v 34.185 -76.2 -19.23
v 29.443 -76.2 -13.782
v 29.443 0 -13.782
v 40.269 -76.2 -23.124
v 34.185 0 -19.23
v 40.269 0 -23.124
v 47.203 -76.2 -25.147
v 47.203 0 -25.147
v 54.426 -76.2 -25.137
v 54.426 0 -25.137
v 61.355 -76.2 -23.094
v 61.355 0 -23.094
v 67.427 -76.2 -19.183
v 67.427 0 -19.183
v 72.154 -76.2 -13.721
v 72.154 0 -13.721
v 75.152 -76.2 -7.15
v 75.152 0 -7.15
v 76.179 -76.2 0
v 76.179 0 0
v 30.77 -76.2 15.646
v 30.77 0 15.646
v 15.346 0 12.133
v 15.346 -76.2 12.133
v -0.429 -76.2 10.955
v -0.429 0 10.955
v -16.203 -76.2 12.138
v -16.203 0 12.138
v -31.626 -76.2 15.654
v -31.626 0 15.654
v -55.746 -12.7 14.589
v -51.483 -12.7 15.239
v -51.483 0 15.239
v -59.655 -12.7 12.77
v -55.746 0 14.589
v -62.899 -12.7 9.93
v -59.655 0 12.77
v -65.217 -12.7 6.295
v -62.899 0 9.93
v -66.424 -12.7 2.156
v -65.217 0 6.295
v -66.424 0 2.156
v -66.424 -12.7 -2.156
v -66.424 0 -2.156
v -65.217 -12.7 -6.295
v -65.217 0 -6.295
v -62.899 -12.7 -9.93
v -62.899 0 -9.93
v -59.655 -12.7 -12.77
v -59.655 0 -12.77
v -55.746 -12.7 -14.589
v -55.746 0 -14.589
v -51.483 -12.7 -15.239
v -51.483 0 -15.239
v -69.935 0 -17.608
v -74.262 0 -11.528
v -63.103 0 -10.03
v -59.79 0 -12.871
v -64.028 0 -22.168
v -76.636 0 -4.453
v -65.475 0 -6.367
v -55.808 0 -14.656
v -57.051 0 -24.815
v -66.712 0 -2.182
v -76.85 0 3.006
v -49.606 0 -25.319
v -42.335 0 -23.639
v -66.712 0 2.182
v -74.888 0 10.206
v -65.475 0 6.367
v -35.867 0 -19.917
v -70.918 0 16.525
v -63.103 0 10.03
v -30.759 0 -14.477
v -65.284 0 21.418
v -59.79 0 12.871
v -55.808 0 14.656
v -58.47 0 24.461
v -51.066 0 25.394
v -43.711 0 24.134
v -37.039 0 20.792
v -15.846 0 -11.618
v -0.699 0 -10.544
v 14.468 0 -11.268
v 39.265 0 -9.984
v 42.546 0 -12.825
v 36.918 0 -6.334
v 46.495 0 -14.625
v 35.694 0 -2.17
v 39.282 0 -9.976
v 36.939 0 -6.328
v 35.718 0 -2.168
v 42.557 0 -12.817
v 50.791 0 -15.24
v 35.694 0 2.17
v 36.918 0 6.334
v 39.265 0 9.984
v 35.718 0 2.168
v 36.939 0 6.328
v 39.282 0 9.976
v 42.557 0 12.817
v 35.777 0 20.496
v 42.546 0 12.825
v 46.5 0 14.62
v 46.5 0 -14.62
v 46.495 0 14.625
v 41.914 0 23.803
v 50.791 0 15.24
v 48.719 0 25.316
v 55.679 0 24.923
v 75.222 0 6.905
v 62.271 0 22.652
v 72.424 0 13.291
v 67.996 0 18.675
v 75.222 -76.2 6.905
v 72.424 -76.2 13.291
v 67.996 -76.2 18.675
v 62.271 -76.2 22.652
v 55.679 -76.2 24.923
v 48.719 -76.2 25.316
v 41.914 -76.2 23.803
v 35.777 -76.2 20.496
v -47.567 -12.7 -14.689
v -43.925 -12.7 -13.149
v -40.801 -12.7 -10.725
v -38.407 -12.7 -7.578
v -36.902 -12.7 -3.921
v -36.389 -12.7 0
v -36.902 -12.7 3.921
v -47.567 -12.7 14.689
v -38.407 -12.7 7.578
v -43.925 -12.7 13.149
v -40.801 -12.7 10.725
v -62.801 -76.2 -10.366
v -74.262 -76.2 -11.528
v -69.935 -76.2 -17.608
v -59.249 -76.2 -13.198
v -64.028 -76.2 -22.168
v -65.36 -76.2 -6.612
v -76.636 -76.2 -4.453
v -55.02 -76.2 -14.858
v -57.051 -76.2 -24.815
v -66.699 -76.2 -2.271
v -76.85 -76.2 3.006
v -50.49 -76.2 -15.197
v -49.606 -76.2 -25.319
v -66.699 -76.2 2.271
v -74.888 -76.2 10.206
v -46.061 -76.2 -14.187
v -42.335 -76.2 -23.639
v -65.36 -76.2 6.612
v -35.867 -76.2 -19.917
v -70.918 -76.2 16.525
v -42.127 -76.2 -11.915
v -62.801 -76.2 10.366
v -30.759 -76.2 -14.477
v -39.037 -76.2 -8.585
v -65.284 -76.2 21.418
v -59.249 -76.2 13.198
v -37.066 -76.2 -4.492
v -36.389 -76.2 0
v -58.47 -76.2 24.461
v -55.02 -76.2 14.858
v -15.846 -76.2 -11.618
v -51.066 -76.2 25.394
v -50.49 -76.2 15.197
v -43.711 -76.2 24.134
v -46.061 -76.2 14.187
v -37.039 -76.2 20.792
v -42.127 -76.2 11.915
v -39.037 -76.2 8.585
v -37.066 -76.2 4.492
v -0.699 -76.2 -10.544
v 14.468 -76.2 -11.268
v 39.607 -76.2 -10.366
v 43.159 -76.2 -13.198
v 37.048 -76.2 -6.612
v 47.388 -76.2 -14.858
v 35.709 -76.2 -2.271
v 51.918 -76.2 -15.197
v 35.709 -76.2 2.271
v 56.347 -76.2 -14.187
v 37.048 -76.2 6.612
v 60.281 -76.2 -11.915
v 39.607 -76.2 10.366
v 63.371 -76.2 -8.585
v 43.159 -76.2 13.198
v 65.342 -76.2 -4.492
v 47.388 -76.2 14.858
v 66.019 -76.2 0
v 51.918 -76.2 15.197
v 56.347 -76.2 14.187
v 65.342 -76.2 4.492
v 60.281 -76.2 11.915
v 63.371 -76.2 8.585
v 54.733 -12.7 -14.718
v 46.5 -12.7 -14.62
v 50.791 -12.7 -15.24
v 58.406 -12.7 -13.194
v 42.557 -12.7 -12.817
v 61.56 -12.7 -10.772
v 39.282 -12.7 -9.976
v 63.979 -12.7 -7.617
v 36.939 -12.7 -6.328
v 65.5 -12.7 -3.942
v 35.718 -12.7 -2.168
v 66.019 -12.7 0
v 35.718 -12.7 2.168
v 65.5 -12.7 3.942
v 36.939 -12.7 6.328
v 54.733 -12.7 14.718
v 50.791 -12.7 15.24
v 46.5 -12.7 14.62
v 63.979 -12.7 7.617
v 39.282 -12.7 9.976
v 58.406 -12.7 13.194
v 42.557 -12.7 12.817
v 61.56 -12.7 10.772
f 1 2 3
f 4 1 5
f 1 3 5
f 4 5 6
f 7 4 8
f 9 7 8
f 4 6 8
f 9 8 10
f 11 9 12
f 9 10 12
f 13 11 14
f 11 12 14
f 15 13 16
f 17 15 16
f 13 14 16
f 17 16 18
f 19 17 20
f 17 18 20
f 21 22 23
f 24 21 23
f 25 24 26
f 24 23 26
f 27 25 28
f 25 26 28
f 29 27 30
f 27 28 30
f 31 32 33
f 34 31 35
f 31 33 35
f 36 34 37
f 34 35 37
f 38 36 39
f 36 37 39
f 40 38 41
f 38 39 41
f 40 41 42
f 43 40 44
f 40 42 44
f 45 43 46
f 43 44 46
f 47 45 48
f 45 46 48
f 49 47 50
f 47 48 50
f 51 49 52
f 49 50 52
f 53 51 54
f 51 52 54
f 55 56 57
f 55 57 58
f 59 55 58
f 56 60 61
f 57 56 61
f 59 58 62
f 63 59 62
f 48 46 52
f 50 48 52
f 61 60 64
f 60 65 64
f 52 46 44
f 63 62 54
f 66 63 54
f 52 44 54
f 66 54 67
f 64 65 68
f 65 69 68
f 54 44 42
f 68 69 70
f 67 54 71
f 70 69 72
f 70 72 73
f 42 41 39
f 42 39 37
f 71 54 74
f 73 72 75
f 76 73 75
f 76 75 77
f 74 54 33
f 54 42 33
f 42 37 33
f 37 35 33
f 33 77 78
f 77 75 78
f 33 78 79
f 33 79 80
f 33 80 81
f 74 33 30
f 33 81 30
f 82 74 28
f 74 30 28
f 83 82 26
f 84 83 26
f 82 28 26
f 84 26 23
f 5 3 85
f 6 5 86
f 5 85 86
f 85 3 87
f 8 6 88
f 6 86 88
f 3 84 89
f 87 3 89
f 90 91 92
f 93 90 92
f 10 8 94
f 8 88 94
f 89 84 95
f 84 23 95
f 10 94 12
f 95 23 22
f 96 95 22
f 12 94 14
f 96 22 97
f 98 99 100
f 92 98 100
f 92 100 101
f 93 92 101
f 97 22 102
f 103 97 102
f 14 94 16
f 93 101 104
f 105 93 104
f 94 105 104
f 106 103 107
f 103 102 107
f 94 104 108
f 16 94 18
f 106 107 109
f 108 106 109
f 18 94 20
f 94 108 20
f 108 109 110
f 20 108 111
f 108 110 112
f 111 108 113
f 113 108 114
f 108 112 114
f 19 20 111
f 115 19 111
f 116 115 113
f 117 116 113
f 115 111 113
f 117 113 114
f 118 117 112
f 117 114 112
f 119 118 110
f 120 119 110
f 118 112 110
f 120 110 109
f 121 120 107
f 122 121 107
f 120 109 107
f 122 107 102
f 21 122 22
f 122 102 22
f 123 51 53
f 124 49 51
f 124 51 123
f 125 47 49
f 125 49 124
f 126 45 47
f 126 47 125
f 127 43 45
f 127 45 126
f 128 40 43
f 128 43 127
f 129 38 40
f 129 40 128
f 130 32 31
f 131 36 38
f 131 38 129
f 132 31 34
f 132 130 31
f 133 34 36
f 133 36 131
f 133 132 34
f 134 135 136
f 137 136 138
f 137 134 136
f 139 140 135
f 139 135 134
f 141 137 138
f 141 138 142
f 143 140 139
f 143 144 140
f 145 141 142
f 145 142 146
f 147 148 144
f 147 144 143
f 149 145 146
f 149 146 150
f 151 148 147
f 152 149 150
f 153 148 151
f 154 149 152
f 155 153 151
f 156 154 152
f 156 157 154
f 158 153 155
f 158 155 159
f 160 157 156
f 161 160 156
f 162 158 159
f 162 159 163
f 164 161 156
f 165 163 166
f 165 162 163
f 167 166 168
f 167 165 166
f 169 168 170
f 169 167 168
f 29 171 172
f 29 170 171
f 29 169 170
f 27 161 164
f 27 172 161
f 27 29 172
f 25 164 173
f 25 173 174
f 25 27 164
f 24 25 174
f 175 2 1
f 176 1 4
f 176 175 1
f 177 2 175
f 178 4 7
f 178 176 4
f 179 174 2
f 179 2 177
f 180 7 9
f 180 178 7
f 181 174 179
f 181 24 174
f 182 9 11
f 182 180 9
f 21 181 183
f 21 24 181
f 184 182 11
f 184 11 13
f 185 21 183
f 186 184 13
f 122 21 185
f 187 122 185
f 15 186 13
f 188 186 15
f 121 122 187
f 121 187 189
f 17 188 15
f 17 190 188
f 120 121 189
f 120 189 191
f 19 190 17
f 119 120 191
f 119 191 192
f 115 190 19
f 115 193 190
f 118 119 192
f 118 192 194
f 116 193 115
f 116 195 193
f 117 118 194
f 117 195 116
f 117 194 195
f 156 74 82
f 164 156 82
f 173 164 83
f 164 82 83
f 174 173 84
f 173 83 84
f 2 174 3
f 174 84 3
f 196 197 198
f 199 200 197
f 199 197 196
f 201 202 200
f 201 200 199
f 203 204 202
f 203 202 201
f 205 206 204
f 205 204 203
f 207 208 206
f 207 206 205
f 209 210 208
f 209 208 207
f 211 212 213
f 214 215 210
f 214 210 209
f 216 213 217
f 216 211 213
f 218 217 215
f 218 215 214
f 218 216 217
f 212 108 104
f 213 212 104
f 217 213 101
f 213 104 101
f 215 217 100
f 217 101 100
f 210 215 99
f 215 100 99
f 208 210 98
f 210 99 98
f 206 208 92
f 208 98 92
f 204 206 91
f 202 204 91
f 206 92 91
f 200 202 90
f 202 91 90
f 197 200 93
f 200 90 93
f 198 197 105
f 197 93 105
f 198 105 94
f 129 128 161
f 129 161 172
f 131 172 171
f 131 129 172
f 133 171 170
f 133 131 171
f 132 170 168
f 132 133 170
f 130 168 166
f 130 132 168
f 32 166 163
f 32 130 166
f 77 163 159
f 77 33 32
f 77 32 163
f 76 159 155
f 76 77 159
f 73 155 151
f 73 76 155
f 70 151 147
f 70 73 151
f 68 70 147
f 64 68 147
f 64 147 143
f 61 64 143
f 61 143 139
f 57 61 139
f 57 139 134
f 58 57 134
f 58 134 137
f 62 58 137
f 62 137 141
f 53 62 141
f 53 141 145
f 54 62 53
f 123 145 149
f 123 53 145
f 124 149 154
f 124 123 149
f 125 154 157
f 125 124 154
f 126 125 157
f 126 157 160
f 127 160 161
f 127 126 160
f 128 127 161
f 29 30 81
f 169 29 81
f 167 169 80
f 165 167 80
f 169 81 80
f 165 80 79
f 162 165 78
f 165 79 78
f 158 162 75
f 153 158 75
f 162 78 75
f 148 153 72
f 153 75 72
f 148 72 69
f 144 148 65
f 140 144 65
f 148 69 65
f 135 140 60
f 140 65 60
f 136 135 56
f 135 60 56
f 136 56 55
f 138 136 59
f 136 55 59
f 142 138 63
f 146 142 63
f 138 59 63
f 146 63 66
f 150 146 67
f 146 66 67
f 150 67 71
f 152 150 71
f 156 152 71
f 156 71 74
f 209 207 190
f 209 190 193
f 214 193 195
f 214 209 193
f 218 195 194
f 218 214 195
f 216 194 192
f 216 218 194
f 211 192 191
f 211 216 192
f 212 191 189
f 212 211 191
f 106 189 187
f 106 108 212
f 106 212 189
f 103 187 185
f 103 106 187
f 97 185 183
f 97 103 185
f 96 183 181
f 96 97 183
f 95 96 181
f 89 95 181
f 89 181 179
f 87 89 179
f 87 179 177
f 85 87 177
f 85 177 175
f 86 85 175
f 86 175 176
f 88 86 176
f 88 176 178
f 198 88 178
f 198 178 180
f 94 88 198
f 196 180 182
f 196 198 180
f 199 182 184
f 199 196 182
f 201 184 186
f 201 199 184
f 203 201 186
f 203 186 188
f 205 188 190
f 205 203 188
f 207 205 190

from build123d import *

# Parameters (mm, degrees)
F0_R     = 15.24
F1_DEPTH = 76.2
F2_R     = 15.24
F3_DEPTH = 12.7


# Not quite as in the source:
# - the program builds the solid bodies; features that only make, move or delete a surface that nothing else refers to are left out


with BuildPart() as f1:
    # F0 (on Front) → F1 (new body)
    with BuildSketch(Plane.XZ):
        with BuildLine():
            ThreePointArc((-30.7586478548, -14.4772019242), (-27.3878303212, -7.5846439713), (-26.2289766602, 0))
            ThreePointArc((-26.2289766602, 0), (-27.6162300636, 8.2793720106), (-31.6264570452, 15.6543670921))
            ThreePointArc((-31.6264570452, 15.6543670921), (-77.0184488356, -0.7312336534), (-30.7586478548, -14.4772019242))
        make_face()
        with Locations((-51.6289766602, 0)):
            Circle(F0_R, mode=Mode.SUBTRACT)
        with BuildLine():
            ThreePointArc((-31.6264570452, 15.6543670921), (-27.6162300636, 8.2793720106), (-26.2289766602, 0))
            ThreePointArc((-26.2289766602, 0), (-27.3878303212, -7.5846439713), (-30.7586478548, -14.4772019242))
            ThreePointArc((-30.7586478548, -14.4772019242), (-0.6990994055, -10.5436994312), (29.4432734756, -13.7819477124))
            ThreePointArc((29.4432734756, -13.7819477124), (25.4048776906, 1.1438261277), (30.7698211259, 15.6457138385))
            ThreePointArc((30.7698211259, 15.6457138385), (-0.4289690246, 10.9553864554), (-31.6264570452, 15.6543670921))
        make_face()
        with BuildLine():
            ThreePointArc((76.179109931, 0), (59.0532885715, 24.014536594), (30.7698211259, 15.6457138385))
            ThreePointArc((30.7698211259, 15.6457138385), (25.4048776906, 1.1438261277), (29.4432734756, -13.7819477124))
            ThreePointArc((29.4432734756, -13.7819477124), (57.9634593807, -24.3627815116), (76.179109931, 0))
        make_face()
        with Locations((50.779109931, 0)):
            Circle(F0_R, mode=Mode.SUBTRACT)
    extrude(amount=F1_DEPTH)

    # F2 (on Front) → F3 (join)
    with BuildSketch(Plane.XZ):
        with Locations((-51.3377061976, 0)):
            Circle(F2_R)
        with Locations((50.8029804159, 0)):
            Circle(F2_R)
    extrude(amount=F3_DEPTH)


solid = f1.part
